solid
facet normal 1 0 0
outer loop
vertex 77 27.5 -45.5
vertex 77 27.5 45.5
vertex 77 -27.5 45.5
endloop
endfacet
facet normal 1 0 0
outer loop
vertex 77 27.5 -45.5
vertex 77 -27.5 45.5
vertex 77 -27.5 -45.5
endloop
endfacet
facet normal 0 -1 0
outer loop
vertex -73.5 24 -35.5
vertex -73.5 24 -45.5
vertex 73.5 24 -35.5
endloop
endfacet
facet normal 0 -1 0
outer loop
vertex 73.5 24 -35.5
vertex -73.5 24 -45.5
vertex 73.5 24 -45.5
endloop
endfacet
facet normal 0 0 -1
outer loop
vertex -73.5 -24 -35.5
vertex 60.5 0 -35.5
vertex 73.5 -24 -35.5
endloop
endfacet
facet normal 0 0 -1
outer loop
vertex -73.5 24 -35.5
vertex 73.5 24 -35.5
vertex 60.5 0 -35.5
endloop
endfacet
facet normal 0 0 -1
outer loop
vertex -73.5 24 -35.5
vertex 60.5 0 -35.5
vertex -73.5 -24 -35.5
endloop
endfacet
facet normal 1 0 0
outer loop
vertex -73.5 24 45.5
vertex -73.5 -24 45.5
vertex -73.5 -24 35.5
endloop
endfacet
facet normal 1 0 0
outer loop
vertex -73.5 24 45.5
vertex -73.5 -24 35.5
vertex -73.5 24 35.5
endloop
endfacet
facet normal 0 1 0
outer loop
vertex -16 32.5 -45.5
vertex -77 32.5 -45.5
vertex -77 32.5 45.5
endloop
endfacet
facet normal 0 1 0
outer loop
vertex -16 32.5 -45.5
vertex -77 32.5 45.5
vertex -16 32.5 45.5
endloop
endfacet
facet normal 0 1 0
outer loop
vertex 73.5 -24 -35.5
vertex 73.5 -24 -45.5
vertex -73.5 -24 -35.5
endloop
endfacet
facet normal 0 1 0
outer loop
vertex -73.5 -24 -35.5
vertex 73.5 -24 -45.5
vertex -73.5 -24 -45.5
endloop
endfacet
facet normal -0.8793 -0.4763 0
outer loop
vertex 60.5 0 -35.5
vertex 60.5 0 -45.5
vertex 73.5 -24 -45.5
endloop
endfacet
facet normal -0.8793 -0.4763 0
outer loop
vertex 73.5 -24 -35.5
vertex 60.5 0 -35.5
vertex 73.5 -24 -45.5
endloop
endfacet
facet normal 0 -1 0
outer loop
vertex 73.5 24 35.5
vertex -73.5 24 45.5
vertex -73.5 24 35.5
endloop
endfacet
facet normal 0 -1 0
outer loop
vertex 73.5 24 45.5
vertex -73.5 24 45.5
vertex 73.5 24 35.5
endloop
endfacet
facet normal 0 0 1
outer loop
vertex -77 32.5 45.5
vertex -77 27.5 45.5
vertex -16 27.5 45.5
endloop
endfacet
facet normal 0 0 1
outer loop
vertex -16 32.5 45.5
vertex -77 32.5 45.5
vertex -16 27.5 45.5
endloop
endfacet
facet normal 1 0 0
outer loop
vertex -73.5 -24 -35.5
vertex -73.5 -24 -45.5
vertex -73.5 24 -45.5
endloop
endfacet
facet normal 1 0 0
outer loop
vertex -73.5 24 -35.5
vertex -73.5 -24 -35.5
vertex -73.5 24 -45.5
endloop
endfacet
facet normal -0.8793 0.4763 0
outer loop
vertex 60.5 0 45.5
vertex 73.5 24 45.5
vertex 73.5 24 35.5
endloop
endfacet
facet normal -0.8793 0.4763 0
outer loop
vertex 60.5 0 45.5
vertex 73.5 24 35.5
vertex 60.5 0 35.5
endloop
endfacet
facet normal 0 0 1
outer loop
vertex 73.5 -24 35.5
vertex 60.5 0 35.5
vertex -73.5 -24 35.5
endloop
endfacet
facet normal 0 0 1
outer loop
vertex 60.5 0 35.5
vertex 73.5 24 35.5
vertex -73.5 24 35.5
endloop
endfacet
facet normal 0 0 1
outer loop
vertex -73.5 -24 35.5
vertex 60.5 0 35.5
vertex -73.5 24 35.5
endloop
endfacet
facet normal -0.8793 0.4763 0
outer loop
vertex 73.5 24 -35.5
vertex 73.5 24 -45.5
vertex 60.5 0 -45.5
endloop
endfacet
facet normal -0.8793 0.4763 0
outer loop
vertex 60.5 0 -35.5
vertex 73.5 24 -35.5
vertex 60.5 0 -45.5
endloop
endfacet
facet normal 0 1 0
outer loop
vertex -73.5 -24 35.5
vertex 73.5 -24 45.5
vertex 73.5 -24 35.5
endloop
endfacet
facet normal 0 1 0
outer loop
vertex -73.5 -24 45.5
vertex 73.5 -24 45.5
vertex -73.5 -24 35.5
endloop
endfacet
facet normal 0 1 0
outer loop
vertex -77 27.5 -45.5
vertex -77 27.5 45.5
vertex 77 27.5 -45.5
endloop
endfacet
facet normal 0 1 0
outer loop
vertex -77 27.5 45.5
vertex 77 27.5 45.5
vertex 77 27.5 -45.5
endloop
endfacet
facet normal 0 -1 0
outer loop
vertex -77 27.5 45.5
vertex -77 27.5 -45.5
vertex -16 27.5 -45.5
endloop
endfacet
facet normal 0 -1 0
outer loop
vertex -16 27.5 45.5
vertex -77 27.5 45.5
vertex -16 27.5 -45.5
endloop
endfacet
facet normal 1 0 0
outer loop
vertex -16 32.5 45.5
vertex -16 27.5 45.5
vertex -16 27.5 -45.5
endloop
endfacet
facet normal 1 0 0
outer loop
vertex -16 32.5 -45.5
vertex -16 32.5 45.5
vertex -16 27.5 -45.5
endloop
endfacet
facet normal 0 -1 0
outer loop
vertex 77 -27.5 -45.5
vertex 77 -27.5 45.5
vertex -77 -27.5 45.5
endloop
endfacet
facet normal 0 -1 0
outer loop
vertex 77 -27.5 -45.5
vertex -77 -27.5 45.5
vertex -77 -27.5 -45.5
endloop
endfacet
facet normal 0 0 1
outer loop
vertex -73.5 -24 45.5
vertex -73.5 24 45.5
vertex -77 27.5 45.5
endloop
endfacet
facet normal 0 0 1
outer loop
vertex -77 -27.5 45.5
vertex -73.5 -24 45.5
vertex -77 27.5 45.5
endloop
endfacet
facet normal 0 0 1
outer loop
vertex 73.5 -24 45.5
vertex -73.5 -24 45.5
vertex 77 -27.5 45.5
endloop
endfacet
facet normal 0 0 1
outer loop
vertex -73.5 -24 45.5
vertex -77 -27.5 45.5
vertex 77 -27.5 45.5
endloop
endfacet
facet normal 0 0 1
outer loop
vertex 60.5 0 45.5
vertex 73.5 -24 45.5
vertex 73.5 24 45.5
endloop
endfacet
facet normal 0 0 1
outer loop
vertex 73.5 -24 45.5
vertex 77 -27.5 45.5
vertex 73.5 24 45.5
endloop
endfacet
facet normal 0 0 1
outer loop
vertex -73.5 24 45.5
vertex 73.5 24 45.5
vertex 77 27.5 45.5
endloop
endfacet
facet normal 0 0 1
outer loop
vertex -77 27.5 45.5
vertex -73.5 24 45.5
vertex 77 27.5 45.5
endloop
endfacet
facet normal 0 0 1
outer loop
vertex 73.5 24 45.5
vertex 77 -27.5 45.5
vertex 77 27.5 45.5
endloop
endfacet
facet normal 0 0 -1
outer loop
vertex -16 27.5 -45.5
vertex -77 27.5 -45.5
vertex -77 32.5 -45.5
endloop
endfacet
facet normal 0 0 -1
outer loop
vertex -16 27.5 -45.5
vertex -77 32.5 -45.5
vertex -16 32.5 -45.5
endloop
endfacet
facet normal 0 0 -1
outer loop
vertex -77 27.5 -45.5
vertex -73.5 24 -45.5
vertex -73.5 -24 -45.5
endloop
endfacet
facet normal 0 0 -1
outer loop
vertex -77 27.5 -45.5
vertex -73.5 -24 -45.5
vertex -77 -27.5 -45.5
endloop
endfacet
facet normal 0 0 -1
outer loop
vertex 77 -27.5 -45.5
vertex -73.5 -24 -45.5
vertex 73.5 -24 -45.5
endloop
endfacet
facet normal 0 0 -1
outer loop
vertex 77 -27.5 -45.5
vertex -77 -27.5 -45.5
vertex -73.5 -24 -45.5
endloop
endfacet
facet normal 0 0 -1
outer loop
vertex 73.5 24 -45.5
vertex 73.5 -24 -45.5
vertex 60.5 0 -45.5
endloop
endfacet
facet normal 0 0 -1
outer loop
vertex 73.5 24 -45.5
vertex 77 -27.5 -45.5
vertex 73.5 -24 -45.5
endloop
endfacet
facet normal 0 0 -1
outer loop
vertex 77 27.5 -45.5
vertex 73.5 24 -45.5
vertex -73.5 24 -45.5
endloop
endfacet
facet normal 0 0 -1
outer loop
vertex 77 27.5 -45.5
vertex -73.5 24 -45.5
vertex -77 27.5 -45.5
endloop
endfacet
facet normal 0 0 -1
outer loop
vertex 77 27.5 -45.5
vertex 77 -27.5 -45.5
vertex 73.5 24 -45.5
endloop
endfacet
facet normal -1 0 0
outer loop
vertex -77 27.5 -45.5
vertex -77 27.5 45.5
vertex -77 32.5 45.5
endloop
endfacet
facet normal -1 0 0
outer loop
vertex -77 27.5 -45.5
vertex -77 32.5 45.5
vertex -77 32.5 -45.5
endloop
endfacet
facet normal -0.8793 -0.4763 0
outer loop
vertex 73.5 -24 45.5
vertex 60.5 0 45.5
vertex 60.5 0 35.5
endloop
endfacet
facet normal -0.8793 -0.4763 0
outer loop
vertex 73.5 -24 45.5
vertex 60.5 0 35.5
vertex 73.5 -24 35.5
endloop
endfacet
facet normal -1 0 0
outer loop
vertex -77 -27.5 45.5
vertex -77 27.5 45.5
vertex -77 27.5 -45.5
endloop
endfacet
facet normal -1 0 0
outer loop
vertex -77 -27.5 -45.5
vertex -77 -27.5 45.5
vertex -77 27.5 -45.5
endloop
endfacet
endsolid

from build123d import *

# Parameters (mm, degrees)
ESQUISSE1_W             = 91
ESQUISSE1_H             = 55
BOSS_EXTRU_1_DEPTH      = 77
ESQUISSE3_W             = 61
ESQUISSE3_H             = 91
BOSS_EXTRU_2_DEPTH      = 5
ENL_V_MAT_EXTRU_1_DEPTH = 10


with BuildPart() as part:
    # Esquisse1 → Boss.-Extru.1 (new, symmetric)
    with BuildSketch(Plane(origin=(0, 0, 0), x_dir=(0, 0, -1), z_dir=(1, 0, 0))):
        Rectangle(ESQUISSE1_W, ESQUISSE1_H)
    extrude(amount=BOSS_EXTRU_1_DEPTH, both=True)

    # Esquisse4 → Enlèv. mat.-Extru.1 (cut)
    with BuildSketch(Plane.XY.offset(45.5)):
        Polygon((-73.5, 24), (73.5, 24), (60.5, 0), (73.5, -24), (-73.5, -24), align=None)
    enl_v_mat_extru_1 = extrude(amount=-ENL_V_MAT_EXTRU_1_DEPTH, mode=Mode.SUBTRACT)

    # Symétrie1: Enlèv. mat.-Extru.1 across plane
    add(enl_v_mat_extru_1.mirror(Plane.XY), mode=Mode.SUBTRACT)


with BuildPart() as body_2:
    # Esquisse3 → Boss.-Extru.2 (new body)
    with BuildSketch(Plane(origin=(0, 27.5, 0), x_dir=(1, 0, 0), z_dir=(0, 1, 0))):
        with Locations((-46.5, 0)):
            Rectangle(ESQUISSE3_W, ESQUISSE3_H)
    extrude(amount=BOSS_EXTRU_2_DEPTH)


solid = Compound([part.part, body_2.part])
